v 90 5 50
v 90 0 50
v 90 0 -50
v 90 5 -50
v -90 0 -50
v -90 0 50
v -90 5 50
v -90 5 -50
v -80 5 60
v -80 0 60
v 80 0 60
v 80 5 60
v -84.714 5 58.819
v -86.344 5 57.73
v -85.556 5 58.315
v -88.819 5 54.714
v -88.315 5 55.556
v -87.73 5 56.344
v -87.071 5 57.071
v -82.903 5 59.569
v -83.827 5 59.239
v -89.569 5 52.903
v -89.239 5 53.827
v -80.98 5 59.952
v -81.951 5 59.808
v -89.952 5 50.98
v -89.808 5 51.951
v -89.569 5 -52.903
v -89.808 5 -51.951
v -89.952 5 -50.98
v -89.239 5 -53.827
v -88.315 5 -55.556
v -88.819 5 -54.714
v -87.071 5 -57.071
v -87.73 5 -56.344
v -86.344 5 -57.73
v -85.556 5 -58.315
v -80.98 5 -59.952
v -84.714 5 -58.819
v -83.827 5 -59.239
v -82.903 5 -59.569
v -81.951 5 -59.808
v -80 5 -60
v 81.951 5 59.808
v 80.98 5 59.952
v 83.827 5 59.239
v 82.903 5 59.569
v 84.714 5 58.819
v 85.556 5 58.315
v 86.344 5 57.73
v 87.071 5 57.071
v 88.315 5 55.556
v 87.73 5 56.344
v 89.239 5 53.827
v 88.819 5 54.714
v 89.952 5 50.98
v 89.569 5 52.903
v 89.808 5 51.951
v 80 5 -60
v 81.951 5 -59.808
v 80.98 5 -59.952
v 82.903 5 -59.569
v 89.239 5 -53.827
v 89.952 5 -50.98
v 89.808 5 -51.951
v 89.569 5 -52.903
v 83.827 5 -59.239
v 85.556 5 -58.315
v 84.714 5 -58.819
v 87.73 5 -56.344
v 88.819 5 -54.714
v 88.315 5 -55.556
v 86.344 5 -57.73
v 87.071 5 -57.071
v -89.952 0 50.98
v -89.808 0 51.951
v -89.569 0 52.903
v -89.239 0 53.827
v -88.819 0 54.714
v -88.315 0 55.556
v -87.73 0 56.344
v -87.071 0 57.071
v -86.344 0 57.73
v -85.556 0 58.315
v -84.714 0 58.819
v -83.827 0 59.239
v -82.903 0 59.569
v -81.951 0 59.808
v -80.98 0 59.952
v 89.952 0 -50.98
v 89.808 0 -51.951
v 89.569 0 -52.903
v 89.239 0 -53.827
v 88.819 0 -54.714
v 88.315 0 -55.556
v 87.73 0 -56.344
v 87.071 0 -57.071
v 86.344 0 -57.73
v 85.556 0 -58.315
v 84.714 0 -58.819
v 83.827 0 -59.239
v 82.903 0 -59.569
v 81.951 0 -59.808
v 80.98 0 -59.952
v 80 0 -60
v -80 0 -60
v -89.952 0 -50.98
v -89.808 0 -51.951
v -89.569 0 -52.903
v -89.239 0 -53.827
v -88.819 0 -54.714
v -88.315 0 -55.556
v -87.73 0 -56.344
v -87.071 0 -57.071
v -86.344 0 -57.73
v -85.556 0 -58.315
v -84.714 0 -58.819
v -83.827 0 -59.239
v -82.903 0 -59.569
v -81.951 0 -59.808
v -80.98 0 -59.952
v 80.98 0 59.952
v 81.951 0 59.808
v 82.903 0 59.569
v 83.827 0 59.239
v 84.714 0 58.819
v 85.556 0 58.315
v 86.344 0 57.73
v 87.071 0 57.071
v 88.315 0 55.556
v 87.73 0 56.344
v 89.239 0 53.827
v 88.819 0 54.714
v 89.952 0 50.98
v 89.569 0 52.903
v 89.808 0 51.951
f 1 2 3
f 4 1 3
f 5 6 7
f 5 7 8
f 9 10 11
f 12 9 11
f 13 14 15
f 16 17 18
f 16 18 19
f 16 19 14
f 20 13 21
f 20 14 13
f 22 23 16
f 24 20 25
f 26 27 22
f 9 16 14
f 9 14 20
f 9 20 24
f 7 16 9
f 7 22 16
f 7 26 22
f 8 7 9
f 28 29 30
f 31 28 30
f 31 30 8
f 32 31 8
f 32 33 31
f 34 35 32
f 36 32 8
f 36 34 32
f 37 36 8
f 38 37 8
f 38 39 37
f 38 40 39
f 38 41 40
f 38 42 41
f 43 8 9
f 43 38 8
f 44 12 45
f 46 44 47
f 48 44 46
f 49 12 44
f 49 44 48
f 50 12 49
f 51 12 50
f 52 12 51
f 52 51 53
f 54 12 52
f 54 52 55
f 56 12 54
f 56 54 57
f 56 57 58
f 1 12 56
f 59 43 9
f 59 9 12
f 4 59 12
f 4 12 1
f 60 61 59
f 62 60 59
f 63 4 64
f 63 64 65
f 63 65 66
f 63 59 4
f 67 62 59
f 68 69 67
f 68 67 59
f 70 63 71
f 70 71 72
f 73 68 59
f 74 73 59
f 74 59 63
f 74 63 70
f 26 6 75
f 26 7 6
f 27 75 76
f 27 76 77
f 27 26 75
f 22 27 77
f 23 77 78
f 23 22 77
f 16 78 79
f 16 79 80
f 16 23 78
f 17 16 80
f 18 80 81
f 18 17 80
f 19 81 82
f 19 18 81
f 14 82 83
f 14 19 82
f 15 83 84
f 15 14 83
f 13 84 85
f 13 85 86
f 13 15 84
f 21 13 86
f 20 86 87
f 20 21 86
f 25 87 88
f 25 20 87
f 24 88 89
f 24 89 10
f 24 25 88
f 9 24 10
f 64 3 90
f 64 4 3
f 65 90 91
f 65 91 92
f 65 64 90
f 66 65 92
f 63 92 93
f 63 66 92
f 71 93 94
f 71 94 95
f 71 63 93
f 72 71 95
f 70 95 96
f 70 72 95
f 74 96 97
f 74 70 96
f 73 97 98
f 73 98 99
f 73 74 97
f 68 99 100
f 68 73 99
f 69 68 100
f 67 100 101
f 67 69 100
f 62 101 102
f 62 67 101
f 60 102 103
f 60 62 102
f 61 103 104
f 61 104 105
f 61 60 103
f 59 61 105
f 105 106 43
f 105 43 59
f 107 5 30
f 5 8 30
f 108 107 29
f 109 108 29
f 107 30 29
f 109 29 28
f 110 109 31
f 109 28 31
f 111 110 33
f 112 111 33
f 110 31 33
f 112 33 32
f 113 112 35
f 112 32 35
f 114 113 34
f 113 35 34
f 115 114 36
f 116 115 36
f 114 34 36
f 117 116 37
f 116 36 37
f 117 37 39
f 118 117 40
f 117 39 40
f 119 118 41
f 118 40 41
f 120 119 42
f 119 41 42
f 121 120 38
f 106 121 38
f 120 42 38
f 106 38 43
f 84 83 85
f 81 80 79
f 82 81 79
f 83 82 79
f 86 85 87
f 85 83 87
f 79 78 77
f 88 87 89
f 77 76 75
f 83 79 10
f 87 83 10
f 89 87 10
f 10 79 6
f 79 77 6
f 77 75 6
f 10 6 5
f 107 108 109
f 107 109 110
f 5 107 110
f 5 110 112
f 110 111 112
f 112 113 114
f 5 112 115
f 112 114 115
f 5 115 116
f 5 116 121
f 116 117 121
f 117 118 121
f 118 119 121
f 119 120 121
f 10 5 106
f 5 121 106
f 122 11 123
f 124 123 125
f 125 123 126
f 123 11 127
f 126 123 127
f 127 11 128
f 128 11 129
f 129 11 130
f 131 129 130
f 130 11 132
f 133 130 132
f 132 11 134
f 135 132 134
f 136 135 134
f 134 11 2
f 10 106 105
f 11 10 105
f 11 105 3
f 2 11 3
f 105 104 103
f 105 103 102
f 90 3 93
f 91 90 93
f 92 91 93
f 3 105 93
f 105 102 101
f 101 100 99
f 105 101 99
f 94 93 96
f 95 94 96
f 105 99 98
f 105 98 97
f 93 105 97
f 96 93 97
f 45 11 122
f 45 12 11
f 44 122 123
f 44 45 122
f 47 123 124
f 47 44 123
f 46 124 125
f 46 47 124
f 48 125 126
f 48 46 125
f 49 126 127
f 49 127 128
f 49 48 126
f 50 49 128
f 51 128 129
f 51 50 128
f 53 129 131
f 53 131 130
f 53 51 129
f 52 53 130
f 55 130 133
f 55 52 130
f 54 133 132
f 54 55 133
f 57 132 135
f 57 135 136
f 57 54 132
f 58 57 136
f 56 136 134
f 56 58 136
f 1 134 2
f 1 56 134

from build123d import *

# Parameters (mm, degrees)
SKETCH1_W           = 180
SKETCH1_H           = 120
BOSS_EXTRUDE1_DEPTH = 5
FILLET1_R           = 10
FILLET2_R           = 10
FILLET3_R           = 10
FILLET4_R           = 10


with BuildPart() as part:
    # Sketch1 → Boss-Extrude1 (new body)
    with BuildSketch(Plane(origin=(0, 0, 0), x_dir=(1, 0, 0), z_dir=(0, 1, 0))):
        Rectangle(SKETCH1_W, SKETCH1_H)
    extrude(amount=BOSS_EXTRUDE1_DEPTH)

    # Fillet1
    fillet1_edges = [part.edges().sort_by_distance(p)[0] for p in [
        (-90, 2.5, -60),
    ]]
    fillet(fillet1_edges, radius=FILLET1_R)

    # Fillet2
    fillet2_edges = [part.edges().sort_by_distance(p)[0] for p in [
        (-90, 2.5, 60),
    ]]
    fillet(fillet2_edges, radius=FILLET2_R)

    # Fillet3
    fillet3_edges = [part.edges().sort_by_distance(p)[0] for p in [
        (90, 2.5, 60),
    ]]
    fillet(fillet3_edges, radius=FILLET3_R)

    # Fillet4
    fillet4_edges = [part.edges().sort_by_distance(p)[0] for p in [
        (90, 2.5, -60),
    ]]
    fillet(fillet4_edges, radius=FILLET4_R)


solid = part.part
